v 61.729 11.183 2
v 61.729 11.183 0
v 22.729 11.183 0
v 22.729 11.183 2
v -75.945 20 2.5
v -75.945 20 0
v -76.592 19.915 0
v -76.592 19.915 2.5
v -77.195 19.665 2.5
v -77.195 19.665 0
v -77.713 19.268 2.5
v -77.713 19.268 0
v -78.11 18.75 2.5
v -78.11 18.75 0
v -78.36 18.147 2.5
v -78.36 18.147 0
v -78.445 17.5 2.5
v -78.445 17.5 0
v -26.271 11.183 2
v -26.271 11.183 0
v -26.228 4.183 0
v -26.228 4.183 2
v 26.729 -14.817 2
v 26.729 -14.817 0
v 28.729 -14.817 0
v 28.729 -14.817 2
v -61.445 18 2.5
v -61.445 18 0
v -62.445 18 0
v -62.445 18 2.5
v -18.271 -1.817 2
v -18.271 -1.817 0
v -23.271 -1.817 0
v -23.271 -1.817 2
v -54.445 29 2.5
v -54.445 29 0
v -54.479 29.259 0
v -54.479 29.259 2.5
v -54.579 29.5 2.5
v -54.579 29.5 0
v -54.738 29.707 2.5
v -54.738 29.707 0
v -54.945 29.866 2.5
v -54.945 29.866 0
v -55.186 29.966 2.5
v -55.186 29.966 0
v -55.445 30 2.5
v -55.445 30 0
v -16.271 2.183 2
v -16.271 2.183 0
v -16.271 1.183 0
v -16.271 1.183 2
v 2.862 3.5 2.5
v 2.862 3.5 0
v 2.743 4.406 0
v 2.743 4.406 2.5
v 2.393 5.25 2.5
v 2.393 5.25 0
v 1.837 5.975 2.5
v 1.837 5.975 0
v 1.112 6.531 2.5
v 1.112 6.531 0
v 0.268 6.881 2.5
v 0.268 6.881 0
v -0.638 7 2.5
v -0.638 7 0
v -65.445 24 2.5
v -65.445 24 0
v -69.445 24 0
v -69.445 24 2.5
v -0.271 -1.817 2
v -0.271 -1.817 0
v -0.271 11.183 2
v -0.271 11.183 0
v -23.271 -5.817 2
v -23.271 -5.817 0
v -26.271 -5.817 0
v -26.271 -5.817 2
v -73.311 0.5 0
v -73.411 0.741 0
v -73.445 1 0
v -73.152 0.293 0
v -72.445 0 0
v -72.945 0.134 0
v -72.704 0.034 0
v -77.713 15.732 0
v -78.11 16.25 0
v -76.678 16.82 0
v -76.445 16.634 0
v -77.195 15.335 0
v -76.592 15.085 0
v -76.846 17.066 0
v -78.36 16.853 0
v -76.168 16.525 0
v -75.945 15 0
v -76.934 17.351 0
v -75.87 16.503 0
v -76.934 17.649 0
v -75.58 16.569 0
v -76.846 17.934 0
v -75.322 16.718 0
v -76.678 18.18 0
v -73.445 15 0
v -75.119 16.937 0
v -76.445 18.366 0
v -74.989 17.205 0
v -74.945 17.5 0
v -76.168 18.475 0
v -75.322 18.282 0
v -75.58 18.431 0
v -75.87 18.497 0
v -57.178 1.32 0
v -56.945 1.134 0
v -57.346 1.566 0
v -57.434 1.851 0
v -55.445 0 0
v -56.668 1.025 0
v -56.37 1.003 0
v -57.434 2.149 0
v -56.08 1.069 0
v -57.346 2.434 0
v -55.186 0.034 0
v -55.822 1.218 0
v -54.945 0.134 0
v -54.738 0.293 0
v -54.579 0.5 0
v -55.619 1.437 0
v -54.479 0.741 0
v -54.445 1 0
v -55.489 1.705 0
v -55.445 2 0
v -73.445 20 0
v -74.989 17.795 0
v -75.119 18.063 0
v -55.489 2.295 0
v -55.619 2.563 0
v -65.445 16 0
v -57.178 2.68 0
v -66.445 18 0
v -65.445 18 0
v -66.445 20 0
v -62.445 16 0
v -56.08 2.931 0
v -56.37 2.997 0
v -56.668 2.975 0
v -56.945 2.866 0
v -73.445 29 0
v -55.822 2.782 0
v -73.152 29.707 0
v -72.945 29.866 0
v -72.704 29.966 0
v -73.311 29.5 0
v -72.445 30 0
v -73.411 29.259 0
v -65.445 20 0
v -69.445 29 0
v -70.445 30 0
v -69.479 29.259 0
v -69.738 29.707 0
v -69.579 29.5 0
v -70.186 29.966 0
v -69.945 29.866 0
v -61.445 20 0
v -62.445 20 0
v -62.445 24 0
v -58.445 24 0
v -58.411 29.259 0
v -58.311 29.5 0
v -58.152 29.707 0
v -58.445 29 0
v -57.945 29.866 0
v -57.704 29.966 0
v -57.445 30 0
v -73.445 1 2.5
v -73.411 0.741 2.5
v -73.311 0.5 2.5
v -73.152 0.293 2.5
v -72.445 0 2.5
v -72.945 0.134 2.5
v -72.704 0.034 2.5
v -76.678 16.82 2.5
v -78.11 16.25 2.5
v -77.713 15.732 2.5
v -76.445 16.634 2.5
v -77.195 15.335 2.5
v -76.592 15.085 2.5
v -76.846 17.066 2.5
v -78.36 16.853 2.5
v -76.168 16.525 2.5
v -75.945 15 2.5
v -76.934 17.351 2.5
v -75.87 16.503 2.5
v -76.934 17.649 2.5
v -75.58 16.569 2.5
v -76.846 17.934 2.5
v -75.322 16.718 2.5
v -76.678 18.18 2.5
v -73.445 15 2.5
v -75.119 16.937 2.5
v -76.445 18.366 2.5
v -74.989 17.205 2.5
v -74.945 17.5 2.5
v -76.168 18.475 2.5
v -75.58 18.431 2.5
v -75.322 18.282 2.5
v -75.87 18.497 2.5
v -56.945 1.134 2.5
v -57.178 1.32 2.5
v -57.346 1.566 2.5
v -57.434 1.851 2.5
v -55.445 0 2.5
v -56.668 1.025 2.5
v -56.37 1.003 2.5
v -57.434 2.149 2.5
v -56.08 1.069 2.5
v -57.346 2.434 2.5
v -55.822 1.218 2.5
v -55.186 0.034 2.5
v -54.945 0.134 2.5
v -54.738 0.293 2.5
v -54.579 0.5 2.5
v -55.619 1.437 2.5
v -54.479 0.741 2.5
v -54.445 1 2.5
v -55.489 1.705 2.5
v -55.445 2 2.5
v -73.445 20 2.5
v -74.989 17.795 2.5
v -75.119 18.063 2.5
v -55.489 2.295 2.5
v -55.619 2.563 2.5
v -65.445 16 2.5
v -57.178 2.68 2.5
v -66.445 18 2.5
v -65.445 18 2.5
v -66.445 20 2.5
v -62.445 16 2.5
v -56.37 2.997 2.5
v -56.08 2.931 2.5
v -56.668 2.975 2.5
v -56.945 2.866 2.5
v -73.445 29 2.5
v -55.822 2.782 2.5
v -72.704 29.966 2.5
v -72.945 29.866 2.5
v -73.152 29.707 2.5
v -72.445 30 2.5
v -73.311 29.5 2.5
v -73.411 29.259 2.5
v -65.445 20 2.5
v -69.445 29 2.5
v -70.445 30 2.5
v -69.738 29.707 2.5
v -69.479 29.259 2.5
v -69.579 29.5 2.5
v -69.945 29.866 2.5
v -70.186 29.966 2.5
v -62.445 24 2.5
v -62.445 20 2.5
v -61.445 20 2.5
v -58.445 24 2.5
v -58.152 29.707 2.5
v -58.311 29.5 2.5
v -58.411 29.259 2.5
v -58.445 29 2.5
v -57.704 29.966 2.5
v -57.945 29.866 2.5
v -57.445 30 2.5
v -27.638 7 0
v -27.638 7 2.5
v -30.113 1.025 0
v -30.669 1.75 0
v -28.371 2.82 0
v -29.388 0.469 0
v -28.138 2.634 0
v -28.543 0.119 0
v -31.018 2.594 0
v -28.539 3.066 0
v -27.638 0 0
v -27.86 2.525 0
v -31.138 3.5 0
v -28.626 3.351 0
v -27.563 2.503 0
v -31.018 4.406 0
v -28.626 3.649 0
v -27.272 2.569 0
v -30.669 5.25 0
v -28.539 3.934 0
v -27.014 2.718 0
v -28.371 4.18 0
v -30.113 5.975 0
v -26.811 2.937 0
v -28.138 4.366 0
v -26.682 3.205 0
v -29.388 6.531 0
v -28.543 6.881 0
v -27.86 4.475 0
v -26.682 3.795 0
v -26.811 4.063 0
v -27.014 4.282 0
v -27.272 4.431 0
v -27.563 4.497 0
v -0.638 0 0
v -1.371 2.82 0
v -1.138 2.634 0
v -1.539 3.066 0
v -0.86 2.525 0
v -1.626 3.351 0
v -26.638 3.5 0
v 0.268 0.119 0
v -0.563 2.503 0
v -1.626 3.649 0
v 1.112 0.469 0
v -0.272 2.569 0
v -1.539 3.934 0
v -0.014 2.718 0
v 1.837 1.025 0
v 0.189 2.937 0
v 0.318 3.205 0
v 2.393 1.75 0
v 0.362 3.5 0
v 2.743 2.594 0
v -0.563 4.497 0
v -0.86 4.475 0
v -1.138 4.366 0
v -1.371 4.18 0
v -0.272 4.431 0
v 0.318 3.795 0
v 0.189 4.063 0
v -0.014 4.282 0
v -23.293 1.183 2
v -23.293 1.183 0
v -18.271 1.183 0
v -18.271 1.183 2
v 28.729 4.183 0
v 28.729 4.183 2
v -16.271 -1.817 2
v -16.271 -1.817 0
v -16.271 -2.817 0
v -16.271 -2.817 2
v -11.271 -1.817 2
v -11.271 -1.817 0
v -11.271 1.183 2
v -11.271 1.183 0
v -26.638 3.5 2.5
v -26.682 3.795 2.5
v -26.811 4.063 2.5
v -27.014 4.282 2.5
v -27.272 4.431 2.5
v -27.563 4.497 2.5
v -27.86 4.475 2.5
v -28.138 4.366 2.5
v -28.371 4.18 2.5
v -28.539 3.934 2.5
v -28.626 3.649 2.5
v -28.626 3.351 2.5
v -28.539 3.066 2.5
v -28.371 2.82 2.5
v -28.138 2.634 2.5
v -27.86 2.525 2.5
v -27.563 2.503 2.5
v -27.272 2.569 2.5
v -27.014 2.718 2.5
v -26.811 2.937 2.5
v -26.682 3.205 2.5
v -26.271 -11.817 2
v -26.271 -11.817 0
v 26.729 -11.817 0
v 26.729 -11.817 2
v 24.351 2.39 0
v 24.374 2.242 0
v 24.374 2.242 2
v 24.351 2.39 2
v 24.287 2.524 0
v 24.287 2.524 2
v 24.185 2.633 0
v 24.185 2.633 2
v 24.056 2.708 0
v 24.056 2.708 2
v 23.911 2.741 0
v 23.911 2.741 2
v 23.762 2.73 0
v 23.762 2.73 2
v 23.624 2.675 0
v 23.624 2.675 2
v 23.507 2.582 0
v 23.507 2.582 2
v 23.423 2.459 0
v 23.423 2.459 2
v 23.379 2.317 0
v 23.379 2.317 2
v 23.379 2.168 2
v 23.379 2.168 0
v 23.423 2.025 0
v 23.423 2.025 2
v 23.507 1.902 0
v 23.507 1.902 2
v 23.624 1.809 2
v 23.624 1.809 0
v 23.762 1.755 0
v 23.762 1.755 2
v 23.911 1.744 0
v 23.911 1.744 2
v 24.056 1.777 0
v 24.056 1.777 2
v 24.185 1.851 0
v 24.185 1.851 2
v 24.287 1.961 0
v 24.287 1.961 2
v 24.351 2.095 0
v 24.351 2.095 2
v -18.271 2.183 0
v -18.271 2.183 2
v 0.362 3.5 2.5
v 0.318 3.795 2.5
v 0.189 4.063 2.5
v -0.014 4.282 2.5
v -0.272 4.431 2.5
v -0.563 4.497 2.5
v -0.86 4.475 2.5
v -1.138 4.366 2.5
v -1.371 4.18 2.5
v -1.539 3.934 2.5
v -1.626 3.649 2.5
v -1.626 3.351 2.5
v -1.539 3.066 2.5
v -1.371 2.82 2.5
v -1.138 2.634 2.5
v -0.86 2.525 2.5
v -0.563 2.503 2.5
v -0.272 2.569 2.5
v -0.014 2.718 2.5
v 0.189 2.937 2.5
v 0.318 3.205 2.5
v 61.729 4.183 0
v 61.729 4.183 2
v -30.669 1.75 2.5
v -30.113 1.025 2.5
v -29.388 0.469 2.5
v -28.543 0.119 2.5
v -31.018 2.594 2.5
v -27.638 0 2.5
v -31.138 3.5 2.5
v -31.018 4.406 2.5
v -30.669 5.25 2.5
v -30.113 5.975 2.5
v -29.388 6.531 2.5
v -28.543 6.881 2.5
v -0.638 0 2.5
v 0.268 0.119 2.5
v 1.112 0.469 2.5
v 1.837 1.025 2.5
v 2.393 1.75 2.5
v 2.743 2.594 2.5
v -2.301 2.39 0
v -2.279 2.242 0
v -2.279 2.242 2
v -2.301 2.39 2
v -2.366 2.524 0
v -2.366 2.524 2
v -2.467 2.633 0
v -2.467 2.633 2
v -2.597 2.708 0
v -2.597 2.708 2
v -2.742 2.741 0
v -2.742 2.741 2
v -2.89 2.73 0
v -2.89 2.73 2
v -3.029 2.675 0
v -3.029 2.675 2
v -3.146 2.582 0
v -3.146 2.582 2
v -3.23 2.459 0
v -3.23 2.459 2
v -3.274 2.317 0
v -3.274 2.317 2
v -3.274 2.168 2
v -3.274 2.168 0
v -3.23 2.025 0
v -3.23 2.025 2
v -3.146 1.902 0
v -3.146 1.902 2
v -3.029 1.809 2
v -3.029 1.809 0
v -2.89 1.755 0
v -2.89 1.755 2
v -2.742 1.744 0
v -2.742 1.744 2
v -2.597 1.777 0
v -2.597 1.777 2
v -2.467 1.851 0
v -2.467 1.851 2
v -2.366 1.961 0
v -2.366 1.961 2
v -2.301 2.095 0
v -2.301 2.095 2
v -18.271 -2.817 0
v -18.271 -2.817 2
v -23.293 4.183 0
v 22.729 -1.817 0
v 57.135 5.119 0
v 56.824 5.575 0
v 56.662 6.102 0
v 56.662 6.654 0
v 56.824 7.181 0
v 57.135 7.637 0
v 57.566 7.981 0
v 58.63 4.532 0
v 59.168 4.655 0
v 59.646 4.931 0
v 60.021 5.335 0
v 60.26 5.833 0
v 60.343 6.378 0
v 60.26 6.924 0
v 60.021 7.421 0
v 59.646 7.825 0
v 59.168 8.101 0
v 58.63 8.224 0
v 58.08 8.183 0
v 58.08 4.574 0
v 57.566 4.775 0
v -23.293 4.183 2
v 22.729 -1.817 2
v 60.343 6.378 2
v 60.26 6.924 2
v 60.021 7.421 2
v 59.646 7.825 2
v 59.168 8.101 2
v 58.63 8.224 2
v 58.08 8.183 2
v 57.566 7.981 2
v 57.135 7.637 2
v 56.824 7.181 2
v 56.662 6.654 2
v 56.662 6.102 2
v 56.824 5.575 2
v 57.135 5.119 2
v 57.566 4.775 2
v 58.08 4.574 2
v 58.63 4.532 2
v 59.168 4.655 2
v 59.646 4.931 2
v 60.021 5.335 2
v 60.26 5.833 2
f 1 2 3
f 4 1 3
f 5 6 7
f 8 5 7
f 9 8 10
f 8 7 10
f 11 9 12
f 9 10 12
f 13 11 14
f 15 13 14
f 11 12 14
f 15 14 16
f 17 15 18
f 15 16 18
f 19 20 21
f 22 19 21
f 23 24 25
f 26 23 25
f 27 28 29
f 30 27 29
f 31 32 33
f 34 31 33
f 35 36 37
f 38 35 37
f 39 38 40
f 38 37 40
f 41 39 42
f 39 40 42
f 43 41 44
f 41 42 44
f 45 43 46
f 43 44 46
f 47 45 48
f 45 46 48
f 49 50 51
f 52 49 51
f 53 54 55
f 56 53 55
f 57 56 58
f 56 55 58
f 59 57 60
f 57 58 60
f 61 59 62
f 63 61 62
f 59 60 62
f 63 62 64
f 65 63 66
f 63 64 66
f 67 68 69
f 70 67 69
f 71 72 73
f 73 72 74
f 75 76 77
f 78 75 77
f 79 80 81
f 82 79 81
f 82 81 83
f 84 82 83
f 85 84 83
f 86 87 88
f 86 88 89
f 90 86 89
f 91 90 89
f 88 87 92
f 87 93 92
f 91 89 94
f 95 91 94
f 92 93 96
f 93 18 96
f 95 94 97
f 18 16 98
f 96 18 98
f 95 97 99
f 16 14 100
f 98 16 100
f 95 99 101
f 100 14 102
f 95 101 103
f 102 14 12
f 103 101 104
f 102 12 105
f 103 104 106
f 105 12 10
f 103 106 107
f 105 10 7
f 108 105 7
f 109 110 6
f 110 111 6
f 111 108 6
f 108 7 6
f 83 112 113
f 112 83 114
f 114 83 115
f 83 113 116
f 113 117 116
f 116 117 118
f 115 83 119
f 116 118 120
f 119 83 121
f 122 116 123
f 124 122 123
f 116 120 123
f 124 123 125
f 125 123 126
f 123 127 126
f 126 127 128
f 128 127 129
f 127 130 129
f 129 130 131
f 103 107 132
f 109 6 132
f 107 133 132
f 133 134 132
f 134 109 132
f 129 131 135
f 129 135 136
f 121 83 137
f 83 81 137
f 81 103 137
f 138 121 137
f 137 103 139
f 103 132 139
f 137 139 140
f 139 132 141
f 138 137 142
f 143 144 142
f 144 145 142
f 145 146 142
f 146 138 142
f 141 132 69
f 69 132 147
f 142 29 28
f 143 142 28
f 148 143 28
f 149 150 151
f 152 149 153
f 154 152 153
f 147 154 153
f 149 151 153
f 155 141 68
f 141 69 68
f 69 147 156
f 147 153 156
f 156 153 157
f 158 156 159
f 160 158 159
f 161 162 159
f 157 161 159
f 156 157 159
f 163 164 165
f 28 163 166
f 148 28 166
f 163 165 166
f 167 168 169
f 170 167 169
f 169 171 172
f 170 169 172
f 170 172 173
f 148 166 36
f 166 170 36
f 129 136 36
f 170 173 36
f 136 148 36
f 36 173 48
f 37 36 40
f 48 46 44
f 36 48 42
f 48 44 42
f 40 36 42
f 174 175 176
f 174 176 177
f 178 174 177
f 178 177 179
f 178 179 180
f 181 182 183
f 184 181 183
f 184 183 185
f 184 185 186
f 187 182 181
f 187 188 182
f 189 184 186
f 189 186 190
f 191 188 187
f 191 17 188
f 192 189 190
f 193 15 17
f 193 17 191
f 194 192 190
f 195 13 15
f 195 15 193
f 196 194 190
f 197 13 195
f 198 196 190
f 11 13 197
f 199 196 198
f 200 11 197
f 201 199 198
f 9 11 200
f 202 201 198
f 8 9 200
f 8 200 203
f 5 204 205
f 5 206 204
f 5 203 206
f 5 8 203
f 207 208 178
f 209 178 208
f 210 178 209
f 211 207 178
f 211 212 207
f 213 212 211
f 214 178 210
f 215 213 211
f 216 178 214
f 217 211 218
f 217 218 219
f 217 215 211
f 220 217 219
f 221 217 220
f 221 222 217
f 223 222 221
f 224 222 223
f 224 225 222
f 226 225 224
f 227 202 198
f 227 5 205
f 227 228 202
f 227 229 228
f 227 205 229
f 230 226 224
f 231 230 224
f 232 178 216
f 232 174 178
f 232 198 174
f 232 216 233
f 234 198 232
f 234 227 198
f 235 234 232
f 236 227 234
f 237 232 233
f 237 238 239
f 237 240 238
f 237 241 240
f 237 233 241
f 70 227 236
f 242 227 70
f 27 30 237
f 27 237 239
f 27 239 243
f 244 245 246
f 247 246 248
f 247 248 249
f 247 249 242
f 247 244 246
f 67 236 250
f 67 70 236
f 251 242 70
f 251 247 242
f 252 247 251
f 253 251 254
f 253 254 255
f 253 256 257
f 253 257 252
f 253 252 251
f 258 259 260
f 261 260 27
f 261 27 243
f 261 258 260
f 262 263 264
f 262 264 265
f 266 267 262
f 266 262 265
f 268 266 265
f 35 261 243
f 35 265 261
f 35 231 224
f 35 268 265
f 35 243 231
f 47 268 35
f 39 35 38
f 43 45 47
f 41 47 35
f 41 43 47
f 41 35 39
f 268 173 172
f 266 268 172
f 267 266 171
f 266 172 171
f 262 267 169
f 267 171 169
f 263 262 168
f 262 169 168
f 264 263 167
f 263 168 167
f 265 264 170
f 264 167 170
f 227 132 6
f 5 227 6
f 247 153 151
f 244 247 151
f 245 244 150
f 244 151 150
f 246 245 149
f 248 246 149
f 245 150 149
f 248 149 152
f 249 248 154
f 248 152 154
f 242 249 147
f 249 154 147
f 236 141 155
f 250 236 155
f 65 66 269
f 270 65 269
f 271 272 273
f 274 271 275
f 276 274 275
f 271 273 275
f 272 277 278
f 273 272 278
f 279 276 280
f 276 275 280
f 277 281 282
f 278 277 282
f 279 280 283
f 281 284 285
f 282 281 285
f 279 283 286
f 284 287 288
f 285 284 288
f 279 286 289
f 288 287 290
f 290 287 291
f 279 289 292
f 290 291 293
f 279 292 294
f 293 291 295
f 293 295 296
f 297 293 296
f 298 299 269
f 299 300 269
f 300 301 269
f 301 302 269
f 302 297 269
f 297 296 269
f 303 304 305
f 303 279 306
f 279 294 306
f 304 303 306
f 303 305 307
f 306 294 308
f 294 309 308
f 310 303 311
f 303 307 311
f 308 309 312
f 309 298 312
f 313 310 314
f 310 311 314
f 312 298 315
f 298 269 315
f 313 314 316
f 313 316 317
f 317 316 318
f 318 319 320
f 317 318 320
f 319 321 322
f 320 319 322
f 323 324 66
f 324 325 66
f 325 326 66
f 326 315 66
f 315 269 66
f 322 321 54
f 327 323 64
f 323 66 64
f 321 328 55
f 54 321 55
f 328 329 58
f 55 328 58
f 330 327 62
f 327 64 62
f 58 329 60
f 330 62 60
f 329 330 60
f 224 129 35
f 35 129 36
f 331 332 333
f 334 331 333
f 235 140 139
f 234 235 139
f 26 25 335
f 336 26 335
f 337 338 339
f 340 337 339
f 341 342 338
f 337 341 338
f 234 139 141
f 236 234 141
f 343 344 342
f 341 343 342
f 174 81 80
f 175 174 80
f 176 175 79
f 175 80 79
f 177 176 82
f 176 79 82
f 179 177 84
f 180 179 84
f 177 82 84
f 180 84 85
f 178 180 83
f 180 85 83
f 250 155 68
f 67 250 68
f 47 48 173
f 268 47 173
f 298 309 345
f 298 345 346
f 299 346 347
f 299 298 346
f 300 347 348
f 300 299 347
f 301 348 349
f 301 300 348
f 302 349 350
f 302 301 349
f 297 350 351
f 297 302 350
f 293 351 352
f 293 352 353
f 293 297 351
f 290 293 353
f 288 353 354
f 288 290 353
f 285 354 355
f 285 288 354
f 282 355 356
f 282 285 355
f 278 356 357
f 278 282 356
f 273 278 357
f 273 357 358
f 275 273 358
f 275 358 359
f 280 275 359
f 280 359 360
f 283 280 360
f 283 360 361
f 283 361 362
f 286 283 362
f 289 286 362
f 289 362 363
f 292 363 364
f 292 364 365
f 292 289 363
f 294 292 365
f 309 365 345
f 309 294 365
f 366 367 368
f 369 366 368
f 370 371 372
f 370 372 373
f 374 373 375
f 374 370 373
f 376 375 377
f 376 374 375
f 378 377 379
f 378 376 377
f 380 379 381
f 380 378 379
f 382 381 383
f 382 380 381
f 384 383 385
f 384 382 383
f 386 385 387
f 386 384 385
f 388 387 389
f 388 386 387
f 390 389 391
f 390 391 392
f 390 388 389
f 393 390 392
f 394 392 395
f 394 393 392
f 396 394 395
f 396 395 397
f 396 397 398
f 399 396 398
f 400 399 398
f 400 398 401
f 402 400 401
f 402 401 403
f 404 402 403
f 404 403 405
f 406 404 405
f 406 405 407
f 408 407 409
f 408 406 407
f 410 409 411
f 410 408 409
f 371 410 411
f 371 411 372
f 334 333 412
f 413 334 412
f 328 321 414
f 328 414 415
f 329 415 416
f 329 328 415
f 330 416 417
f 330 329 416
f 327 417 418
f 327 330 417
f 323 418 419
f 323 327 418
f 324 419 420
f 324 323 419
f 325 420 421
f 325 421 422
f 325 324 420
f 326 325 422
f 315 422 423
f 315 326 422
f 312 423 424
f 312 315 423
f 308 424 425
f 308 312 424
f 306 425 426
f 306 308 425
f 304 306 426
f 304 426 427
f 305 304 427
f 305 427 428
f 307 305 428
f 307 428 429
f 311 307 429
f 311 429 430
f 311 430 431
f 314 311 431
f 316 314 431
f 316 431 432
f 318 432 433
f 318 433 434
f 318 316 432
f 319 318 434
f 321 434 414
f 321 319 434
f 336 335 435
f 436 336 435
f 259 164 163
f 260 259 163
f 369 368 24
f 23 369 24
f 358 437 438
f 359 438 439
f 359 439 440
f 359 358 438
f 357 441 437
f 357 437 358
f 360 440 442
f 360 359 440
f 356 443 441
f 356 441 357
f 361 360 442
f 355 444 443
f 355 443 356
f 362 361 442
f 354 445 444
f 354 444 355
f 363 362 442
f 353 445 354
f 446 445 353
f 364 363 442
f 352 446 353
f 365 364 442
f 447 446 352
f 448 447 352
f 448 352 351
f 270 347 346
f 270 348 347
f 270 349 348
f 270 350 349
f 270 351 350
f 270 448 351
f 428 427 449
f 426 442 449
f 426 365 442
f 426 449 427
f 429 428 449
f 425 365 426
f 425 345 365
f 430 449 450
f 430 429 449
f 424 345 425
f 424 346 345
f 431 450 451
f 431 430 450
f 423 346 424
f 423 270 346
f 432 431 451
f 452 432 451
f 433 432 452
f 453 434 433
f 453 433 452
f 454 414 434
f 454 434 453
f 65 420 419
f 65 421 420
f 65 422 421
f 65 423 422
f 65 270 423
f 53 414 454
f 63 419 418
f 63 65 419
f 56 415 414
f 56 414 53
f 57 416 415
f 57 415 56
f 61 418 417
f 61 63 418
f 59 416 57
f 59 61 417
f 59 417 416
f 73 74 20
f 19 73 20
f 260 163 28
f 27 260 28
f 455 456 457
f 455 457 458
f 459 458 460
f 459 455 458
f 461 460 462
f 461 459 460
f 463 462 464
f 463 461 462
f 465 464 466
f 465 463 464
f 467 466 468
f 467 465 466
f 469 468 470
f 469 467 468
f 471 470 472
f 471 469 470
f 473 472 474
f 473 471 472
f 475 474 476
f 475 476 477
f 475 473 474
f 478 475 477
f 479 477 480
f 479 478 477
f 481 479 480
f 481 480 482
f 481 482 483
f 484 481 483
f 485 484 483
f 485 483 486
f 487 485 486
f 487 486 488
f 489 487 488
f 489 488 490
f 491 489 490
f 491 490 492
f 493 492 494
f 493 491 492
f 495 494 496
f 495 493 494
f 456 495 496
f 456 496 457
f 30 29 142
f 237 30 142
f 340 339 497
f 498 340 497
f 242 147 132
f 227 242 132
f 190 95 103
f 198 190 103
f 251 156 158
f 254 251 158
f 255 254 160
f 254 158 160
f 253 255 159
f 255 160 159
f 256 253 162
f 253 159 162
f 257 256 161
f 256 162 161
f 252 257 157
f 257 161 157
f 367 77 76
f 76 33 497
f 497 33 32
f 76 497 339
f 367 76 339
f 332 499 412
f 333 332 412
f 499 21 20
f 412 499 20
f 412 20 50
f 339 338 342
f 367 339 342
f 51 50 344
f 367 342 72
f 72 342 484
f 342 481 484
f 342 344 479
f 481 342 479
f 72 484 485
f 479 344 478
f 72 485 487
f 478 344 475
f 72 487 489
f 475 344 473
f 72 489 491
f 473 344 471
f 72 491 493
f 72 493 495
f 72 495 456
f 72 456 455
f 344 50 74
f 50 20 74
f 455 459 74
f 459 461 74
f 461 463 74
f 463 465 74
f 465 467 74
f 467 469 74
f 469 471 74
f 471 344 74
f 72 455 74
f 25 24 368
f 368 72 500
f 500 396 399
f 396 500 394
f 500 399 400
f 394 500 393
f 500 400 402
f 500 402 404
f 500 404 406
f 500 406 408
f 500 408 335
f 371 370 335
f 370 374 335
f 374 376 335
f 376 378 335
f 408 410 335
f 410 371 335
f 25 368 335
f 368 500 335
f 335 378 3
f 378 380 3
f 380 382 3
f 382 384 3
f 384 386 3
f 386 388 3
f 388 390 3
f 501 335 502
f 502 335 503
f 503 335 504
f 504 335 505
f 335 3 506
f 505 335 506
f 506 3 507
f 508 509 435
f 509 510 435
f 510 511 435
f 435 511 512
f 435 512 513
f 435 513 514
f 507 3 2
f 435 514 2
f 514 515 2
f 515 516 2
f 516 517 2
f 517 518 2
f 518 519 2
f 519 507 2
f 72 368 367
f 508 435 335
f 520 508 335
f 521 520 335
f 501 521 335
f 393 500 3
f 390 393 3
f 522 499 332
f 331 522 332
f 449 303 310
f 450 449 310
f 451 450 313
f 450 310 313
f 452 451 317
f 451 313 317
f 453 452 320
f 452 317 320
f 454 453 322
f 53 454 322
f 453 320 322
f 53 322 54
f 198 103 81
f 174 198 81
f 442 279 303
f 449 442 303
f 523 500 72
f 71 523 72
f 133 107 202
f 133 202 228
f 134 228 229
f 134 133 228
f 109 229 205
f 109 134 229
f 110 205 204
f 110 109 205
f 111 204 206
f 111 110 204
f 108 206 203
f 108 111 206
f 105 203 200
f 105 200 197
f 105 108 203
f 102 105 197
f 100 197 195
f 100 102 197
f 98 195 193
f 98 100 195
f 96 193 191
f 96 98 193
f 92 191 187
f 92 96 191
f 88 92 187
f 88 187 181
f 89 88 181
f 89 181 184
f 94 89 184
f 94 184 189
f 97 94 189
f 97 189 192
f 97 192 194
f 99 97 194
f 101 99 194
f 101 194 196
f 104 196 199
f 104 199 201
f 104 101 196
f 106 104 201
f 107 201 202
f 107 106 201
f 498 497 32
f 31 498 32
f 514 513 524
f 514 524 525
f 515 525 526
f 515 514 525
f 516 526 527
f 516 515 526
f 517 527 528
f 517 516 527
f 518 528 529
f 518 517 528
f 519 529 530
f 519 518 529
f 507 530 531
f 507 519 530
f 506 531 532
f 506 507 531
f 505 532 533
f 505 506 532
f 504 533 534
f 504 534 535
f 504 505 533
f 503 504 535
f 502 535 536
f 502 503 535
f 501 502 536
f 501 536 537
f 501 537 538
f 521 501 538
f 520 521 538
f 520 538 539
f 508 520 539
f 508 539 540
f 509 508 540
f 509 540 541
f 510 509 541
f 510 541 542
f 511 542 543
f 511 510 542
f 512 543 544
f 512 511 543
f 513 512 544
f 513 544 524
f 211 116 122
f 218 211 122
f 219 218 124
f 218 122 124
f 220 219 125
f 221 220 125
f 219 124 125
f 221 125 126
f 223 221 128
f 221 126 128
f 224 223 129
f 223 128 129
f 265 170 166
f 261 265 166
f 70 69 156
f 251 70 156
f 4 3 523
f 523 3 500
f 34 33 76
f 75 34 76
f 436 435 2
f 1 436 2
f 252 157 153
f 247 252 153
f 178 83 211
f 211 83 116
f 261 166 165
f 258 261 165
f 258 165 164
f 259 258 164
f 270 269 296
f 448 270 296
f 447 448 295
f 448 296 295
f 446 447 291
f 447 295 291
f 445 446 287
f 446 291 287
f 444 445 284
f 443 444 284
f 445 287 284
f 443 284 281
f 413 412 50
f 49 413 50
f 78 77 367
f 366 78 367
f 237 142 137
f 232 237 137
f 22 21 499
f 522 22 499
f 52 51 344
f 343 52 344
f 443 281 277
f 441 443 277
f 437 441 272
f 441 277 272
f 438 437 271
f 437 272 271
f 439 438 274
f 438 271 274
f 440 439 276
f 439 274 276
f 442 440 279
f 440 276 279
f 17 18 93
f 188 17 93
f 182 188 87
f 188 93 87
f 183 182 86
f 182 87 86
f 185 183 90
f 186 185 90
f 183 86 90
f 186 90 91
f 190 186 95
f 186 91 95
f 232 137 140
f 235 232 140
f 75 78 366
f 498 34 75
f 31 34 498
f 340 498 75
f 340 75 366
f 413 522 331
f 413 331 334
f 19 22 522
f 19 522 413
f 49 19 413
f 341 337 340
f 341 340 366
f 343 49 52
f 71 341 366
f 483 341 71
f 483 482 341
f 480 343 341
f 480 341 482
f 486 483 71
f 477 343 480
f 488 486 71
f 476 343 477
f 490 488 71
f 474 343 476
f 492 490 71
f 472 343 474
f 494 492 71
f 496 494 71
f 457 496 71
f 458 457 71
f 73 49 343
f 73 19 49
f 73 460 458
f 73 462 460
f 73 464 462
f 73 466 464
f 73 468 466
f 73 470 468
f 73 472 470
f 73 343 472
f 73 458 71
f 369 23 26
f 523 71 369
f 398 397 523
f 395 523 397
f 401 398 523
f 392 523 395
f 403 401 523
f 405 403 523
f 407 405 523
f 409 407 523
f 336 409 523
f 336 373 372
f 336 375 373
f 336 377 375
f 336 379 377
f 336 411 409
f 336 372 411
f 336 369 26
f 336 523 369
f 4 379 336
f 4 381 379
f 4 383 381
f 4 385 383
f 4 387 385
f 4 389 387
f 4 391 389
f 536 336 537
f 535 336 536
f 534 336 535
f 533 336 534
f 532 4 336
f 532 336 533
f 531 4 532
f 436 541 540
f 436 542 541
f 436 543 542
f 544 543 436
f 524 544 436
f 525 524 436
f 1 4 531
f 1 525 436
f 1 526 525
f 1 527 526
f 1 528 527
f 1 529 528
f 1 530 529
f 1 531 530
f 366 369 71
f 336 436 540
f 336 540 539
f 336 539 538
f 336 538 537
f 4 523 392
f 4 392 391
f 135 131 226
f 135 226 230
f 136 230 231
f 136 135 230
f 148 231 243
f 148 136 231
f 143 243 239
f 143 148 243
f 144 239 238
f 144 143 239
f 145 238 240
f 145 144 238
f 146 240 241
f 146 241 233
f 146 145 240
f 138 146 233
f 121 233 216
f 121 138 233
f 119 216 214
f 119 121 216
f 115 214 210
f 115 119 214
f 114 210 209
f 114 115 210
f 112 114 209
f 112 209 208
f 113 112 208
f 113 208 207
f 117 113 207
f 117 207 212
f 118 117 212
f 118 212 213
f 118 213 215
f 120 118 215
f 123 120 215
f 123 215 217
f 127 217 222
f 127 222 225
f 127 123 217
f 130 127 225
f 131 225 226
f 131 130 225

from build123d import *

# Parameters (mm, degrees)
F0_R     = 1
F1_DEPTH = 2.5
F2_DEPTH = 2.5
F3_R     = 1
F4_DEPTH = 2.5
F5_R     = 0.5
F5_R_2   = 1.850845
F6_DEPTH = 2


with BuildPart() as f1:
    # F0 (on Top) → F1 (new body)
    with BuildSketch(Plane.XY):
        with BuildLine():
            Line((-72.445053, 0), (-63.445053, 0))
            Line((-63.445053, 0), (-55.445053, 0))
            ThreePointArc((-55.445053, 0), (-54.737946, 0.292893), (-54.445053, 1))
            Line((-54.445053, 1), (-54.445053, 29))
            ThreePointArc((-54.445053, 29), (-54.737946, 29.707107), (-55.445053, 30))
            Line((-55.445053, 30), (-57.445053, 30))
            ThreePointArc((-57.445053, 30), (-58.152159, 29.707107), (-58.445053, 29))
            Line((-58.445053, 29), (-58.445053, 24))
            Line((-58.445053, 24), (-62.445053, 24))
            Line((-62.445053, 24), (-62.445053, 20))
            Line((-62.445053, 20), (-61.445053, 20))
            Line((-61.445053, 20), (-61.445053, 18))
            Line((-61.445053, 18), (-62.445053, 18))
            Line((-62.445053, 18), (-62.445053, 16))
            Line((-62.445053, 16), (-63.945053, 16))
            Line((-63.945053, 16), (-65.445053, 16))
            Line((-65.445053, 16), (-65.445053, 18))
            Line((-65.445053, 18), (-66.445053, 18))
            Line((-66.445053, 18), (-66.445053, 20))
            Line((-66.445053, 20), (-65.445053, 20))
            Line((-65.445053, 20), (-65.445053, 24))
            Line((-65.445053, 24), (-69.445053, 24))
            Line((-69.445053, 24), (-69.445053, 29))
            ThreePointArc((-69.445053, 29), (-69.737946, 29.707107), (-70.445053, 30))
            Line((-70.445053, 30), (-72.445053, 30))
            ThreePointArc((-72.445053, 30), (-73.152159, 29.707107), (-73.445053, 29))
            Line((-73.445053, 29), (-73.445053, 20))
            Line((-73.445053, 20), (-73.445053, 15))
            Line((-73.445053, 15), (-73.445053, 1))
            ThreePointArc((-73.445053, 1), (-73.152159, 0.292893), (-72.445053, 0))
        make_face()
        with Locations((-56.445053, 2)):
            Circle(F0_R, mode=Mode.SUBTRACT)
    extrude(amount=F1_DEPTH)

    # F0 (on Top) → F2 (join)
    with BuildSketch(Plane.XY):
        with BuildLine():
            Line((-75.945053, 15), (-73.445053, 15))
            Line((-73.445053, 15), (-73.445053, 20))
            Line((-73.445053, 20), (-75.945053, 20))
            ThreePointArc((-75.945053, 20), (-77.71282, 19.267767), (-78.445053, 17.5))
            ThreePointArc((-78.445053, 17.5), (-77.71282, 15.732233), (-75.945053, 15))
        make_face()
        with Locations((-75.945053, 17.5)):
            Circle(F0_R, mode=Mode.SUBTRACT)
    extrude(amount=F2_DEPTH)


with BuildPart() as f4:
    # F3 (on Top) → F4 (new body)
    with BuildSketch(Plane.XY):
        with BuildLine():
            ThreePointArc((-31.137628, 3.5), (-30.112502, 1.025126), (-27.637628, 0))
            Line((-27.637628, 0), (-0.637628, 0))
            ThreePointArc((-0.637628, 0), (1.837245, 1.025126), (2.862372, 3.5))
            ThreePointArc((2.862372, 3.5), (1.837245, 5.974874), (-0.637628, 7))
            Line((-0.637628, 7), (-27.637628, 7))
            ThreePointArc((-27.637628, 7), (-30.112502, 5.974874), (-31.137628, 3.5))
        make_face()
        with Locations((-27.637628, 3.5)):
            Circle(F3_R, mode=Mode.SUBTRACT)
        with Locations((-0.637628, 3.5)):
            Circle(F3_R, mode=Mode.SUBTRACT)
    extrude(amount=F4_DEPTH)


with BuildPart() as f6:
    # F5 (on Top) → F6 (new body)
    with BuildSketch(Plane.XY):
        Polygon((-0.270881, 11.183477), (-26.270881, 11.183477), (-26.228021, 4.183477), (-23.293118, 4.183477), (-23.293118, 1.183477), (-18.270881, 1.183477), (-18.270881, 2.183477), (-16.270881, 2.183477), (-16.270881, 1.183477), (-11.270881, 1.183477), (-11.270881, -1.816523), (-16.270881, -1.816523), (-16.270881, -2.816523), (-18.270881, -2.816523), (-18.270881, -1.816523), (-23.270881, -1.816523), (-23.270881, -5.816523), (-26.270881, -5.816523), (-26.270881, -11.816523), (26.729119, -11.816523), (26.729119, -14.816523), (28.729119, -14.816523), (28.729119, 4.183477), (61.729119, 4.183477), (61.729119, 11.183477), (22.729119, 11.183477), (22.729119, -1.816523), (-0.270881, -1.816523), align=None)
        with Locations((-2.779179, 2.242288)):
            Circle(F5_R, mode=Mode.SUBTRACT)
        with Locations((23.873684, 2.242288)):
            Circle(F5_R, mode=Mode.SUBTRACT)
        with Locations((58.491771, 6.378076)):
            Circle(F5_R_2, mode=Mode.SUBTRACT)
    extrude(amount=F6_DEPTH)


solid = Compound([f1.part, f4.part, f6.part])
